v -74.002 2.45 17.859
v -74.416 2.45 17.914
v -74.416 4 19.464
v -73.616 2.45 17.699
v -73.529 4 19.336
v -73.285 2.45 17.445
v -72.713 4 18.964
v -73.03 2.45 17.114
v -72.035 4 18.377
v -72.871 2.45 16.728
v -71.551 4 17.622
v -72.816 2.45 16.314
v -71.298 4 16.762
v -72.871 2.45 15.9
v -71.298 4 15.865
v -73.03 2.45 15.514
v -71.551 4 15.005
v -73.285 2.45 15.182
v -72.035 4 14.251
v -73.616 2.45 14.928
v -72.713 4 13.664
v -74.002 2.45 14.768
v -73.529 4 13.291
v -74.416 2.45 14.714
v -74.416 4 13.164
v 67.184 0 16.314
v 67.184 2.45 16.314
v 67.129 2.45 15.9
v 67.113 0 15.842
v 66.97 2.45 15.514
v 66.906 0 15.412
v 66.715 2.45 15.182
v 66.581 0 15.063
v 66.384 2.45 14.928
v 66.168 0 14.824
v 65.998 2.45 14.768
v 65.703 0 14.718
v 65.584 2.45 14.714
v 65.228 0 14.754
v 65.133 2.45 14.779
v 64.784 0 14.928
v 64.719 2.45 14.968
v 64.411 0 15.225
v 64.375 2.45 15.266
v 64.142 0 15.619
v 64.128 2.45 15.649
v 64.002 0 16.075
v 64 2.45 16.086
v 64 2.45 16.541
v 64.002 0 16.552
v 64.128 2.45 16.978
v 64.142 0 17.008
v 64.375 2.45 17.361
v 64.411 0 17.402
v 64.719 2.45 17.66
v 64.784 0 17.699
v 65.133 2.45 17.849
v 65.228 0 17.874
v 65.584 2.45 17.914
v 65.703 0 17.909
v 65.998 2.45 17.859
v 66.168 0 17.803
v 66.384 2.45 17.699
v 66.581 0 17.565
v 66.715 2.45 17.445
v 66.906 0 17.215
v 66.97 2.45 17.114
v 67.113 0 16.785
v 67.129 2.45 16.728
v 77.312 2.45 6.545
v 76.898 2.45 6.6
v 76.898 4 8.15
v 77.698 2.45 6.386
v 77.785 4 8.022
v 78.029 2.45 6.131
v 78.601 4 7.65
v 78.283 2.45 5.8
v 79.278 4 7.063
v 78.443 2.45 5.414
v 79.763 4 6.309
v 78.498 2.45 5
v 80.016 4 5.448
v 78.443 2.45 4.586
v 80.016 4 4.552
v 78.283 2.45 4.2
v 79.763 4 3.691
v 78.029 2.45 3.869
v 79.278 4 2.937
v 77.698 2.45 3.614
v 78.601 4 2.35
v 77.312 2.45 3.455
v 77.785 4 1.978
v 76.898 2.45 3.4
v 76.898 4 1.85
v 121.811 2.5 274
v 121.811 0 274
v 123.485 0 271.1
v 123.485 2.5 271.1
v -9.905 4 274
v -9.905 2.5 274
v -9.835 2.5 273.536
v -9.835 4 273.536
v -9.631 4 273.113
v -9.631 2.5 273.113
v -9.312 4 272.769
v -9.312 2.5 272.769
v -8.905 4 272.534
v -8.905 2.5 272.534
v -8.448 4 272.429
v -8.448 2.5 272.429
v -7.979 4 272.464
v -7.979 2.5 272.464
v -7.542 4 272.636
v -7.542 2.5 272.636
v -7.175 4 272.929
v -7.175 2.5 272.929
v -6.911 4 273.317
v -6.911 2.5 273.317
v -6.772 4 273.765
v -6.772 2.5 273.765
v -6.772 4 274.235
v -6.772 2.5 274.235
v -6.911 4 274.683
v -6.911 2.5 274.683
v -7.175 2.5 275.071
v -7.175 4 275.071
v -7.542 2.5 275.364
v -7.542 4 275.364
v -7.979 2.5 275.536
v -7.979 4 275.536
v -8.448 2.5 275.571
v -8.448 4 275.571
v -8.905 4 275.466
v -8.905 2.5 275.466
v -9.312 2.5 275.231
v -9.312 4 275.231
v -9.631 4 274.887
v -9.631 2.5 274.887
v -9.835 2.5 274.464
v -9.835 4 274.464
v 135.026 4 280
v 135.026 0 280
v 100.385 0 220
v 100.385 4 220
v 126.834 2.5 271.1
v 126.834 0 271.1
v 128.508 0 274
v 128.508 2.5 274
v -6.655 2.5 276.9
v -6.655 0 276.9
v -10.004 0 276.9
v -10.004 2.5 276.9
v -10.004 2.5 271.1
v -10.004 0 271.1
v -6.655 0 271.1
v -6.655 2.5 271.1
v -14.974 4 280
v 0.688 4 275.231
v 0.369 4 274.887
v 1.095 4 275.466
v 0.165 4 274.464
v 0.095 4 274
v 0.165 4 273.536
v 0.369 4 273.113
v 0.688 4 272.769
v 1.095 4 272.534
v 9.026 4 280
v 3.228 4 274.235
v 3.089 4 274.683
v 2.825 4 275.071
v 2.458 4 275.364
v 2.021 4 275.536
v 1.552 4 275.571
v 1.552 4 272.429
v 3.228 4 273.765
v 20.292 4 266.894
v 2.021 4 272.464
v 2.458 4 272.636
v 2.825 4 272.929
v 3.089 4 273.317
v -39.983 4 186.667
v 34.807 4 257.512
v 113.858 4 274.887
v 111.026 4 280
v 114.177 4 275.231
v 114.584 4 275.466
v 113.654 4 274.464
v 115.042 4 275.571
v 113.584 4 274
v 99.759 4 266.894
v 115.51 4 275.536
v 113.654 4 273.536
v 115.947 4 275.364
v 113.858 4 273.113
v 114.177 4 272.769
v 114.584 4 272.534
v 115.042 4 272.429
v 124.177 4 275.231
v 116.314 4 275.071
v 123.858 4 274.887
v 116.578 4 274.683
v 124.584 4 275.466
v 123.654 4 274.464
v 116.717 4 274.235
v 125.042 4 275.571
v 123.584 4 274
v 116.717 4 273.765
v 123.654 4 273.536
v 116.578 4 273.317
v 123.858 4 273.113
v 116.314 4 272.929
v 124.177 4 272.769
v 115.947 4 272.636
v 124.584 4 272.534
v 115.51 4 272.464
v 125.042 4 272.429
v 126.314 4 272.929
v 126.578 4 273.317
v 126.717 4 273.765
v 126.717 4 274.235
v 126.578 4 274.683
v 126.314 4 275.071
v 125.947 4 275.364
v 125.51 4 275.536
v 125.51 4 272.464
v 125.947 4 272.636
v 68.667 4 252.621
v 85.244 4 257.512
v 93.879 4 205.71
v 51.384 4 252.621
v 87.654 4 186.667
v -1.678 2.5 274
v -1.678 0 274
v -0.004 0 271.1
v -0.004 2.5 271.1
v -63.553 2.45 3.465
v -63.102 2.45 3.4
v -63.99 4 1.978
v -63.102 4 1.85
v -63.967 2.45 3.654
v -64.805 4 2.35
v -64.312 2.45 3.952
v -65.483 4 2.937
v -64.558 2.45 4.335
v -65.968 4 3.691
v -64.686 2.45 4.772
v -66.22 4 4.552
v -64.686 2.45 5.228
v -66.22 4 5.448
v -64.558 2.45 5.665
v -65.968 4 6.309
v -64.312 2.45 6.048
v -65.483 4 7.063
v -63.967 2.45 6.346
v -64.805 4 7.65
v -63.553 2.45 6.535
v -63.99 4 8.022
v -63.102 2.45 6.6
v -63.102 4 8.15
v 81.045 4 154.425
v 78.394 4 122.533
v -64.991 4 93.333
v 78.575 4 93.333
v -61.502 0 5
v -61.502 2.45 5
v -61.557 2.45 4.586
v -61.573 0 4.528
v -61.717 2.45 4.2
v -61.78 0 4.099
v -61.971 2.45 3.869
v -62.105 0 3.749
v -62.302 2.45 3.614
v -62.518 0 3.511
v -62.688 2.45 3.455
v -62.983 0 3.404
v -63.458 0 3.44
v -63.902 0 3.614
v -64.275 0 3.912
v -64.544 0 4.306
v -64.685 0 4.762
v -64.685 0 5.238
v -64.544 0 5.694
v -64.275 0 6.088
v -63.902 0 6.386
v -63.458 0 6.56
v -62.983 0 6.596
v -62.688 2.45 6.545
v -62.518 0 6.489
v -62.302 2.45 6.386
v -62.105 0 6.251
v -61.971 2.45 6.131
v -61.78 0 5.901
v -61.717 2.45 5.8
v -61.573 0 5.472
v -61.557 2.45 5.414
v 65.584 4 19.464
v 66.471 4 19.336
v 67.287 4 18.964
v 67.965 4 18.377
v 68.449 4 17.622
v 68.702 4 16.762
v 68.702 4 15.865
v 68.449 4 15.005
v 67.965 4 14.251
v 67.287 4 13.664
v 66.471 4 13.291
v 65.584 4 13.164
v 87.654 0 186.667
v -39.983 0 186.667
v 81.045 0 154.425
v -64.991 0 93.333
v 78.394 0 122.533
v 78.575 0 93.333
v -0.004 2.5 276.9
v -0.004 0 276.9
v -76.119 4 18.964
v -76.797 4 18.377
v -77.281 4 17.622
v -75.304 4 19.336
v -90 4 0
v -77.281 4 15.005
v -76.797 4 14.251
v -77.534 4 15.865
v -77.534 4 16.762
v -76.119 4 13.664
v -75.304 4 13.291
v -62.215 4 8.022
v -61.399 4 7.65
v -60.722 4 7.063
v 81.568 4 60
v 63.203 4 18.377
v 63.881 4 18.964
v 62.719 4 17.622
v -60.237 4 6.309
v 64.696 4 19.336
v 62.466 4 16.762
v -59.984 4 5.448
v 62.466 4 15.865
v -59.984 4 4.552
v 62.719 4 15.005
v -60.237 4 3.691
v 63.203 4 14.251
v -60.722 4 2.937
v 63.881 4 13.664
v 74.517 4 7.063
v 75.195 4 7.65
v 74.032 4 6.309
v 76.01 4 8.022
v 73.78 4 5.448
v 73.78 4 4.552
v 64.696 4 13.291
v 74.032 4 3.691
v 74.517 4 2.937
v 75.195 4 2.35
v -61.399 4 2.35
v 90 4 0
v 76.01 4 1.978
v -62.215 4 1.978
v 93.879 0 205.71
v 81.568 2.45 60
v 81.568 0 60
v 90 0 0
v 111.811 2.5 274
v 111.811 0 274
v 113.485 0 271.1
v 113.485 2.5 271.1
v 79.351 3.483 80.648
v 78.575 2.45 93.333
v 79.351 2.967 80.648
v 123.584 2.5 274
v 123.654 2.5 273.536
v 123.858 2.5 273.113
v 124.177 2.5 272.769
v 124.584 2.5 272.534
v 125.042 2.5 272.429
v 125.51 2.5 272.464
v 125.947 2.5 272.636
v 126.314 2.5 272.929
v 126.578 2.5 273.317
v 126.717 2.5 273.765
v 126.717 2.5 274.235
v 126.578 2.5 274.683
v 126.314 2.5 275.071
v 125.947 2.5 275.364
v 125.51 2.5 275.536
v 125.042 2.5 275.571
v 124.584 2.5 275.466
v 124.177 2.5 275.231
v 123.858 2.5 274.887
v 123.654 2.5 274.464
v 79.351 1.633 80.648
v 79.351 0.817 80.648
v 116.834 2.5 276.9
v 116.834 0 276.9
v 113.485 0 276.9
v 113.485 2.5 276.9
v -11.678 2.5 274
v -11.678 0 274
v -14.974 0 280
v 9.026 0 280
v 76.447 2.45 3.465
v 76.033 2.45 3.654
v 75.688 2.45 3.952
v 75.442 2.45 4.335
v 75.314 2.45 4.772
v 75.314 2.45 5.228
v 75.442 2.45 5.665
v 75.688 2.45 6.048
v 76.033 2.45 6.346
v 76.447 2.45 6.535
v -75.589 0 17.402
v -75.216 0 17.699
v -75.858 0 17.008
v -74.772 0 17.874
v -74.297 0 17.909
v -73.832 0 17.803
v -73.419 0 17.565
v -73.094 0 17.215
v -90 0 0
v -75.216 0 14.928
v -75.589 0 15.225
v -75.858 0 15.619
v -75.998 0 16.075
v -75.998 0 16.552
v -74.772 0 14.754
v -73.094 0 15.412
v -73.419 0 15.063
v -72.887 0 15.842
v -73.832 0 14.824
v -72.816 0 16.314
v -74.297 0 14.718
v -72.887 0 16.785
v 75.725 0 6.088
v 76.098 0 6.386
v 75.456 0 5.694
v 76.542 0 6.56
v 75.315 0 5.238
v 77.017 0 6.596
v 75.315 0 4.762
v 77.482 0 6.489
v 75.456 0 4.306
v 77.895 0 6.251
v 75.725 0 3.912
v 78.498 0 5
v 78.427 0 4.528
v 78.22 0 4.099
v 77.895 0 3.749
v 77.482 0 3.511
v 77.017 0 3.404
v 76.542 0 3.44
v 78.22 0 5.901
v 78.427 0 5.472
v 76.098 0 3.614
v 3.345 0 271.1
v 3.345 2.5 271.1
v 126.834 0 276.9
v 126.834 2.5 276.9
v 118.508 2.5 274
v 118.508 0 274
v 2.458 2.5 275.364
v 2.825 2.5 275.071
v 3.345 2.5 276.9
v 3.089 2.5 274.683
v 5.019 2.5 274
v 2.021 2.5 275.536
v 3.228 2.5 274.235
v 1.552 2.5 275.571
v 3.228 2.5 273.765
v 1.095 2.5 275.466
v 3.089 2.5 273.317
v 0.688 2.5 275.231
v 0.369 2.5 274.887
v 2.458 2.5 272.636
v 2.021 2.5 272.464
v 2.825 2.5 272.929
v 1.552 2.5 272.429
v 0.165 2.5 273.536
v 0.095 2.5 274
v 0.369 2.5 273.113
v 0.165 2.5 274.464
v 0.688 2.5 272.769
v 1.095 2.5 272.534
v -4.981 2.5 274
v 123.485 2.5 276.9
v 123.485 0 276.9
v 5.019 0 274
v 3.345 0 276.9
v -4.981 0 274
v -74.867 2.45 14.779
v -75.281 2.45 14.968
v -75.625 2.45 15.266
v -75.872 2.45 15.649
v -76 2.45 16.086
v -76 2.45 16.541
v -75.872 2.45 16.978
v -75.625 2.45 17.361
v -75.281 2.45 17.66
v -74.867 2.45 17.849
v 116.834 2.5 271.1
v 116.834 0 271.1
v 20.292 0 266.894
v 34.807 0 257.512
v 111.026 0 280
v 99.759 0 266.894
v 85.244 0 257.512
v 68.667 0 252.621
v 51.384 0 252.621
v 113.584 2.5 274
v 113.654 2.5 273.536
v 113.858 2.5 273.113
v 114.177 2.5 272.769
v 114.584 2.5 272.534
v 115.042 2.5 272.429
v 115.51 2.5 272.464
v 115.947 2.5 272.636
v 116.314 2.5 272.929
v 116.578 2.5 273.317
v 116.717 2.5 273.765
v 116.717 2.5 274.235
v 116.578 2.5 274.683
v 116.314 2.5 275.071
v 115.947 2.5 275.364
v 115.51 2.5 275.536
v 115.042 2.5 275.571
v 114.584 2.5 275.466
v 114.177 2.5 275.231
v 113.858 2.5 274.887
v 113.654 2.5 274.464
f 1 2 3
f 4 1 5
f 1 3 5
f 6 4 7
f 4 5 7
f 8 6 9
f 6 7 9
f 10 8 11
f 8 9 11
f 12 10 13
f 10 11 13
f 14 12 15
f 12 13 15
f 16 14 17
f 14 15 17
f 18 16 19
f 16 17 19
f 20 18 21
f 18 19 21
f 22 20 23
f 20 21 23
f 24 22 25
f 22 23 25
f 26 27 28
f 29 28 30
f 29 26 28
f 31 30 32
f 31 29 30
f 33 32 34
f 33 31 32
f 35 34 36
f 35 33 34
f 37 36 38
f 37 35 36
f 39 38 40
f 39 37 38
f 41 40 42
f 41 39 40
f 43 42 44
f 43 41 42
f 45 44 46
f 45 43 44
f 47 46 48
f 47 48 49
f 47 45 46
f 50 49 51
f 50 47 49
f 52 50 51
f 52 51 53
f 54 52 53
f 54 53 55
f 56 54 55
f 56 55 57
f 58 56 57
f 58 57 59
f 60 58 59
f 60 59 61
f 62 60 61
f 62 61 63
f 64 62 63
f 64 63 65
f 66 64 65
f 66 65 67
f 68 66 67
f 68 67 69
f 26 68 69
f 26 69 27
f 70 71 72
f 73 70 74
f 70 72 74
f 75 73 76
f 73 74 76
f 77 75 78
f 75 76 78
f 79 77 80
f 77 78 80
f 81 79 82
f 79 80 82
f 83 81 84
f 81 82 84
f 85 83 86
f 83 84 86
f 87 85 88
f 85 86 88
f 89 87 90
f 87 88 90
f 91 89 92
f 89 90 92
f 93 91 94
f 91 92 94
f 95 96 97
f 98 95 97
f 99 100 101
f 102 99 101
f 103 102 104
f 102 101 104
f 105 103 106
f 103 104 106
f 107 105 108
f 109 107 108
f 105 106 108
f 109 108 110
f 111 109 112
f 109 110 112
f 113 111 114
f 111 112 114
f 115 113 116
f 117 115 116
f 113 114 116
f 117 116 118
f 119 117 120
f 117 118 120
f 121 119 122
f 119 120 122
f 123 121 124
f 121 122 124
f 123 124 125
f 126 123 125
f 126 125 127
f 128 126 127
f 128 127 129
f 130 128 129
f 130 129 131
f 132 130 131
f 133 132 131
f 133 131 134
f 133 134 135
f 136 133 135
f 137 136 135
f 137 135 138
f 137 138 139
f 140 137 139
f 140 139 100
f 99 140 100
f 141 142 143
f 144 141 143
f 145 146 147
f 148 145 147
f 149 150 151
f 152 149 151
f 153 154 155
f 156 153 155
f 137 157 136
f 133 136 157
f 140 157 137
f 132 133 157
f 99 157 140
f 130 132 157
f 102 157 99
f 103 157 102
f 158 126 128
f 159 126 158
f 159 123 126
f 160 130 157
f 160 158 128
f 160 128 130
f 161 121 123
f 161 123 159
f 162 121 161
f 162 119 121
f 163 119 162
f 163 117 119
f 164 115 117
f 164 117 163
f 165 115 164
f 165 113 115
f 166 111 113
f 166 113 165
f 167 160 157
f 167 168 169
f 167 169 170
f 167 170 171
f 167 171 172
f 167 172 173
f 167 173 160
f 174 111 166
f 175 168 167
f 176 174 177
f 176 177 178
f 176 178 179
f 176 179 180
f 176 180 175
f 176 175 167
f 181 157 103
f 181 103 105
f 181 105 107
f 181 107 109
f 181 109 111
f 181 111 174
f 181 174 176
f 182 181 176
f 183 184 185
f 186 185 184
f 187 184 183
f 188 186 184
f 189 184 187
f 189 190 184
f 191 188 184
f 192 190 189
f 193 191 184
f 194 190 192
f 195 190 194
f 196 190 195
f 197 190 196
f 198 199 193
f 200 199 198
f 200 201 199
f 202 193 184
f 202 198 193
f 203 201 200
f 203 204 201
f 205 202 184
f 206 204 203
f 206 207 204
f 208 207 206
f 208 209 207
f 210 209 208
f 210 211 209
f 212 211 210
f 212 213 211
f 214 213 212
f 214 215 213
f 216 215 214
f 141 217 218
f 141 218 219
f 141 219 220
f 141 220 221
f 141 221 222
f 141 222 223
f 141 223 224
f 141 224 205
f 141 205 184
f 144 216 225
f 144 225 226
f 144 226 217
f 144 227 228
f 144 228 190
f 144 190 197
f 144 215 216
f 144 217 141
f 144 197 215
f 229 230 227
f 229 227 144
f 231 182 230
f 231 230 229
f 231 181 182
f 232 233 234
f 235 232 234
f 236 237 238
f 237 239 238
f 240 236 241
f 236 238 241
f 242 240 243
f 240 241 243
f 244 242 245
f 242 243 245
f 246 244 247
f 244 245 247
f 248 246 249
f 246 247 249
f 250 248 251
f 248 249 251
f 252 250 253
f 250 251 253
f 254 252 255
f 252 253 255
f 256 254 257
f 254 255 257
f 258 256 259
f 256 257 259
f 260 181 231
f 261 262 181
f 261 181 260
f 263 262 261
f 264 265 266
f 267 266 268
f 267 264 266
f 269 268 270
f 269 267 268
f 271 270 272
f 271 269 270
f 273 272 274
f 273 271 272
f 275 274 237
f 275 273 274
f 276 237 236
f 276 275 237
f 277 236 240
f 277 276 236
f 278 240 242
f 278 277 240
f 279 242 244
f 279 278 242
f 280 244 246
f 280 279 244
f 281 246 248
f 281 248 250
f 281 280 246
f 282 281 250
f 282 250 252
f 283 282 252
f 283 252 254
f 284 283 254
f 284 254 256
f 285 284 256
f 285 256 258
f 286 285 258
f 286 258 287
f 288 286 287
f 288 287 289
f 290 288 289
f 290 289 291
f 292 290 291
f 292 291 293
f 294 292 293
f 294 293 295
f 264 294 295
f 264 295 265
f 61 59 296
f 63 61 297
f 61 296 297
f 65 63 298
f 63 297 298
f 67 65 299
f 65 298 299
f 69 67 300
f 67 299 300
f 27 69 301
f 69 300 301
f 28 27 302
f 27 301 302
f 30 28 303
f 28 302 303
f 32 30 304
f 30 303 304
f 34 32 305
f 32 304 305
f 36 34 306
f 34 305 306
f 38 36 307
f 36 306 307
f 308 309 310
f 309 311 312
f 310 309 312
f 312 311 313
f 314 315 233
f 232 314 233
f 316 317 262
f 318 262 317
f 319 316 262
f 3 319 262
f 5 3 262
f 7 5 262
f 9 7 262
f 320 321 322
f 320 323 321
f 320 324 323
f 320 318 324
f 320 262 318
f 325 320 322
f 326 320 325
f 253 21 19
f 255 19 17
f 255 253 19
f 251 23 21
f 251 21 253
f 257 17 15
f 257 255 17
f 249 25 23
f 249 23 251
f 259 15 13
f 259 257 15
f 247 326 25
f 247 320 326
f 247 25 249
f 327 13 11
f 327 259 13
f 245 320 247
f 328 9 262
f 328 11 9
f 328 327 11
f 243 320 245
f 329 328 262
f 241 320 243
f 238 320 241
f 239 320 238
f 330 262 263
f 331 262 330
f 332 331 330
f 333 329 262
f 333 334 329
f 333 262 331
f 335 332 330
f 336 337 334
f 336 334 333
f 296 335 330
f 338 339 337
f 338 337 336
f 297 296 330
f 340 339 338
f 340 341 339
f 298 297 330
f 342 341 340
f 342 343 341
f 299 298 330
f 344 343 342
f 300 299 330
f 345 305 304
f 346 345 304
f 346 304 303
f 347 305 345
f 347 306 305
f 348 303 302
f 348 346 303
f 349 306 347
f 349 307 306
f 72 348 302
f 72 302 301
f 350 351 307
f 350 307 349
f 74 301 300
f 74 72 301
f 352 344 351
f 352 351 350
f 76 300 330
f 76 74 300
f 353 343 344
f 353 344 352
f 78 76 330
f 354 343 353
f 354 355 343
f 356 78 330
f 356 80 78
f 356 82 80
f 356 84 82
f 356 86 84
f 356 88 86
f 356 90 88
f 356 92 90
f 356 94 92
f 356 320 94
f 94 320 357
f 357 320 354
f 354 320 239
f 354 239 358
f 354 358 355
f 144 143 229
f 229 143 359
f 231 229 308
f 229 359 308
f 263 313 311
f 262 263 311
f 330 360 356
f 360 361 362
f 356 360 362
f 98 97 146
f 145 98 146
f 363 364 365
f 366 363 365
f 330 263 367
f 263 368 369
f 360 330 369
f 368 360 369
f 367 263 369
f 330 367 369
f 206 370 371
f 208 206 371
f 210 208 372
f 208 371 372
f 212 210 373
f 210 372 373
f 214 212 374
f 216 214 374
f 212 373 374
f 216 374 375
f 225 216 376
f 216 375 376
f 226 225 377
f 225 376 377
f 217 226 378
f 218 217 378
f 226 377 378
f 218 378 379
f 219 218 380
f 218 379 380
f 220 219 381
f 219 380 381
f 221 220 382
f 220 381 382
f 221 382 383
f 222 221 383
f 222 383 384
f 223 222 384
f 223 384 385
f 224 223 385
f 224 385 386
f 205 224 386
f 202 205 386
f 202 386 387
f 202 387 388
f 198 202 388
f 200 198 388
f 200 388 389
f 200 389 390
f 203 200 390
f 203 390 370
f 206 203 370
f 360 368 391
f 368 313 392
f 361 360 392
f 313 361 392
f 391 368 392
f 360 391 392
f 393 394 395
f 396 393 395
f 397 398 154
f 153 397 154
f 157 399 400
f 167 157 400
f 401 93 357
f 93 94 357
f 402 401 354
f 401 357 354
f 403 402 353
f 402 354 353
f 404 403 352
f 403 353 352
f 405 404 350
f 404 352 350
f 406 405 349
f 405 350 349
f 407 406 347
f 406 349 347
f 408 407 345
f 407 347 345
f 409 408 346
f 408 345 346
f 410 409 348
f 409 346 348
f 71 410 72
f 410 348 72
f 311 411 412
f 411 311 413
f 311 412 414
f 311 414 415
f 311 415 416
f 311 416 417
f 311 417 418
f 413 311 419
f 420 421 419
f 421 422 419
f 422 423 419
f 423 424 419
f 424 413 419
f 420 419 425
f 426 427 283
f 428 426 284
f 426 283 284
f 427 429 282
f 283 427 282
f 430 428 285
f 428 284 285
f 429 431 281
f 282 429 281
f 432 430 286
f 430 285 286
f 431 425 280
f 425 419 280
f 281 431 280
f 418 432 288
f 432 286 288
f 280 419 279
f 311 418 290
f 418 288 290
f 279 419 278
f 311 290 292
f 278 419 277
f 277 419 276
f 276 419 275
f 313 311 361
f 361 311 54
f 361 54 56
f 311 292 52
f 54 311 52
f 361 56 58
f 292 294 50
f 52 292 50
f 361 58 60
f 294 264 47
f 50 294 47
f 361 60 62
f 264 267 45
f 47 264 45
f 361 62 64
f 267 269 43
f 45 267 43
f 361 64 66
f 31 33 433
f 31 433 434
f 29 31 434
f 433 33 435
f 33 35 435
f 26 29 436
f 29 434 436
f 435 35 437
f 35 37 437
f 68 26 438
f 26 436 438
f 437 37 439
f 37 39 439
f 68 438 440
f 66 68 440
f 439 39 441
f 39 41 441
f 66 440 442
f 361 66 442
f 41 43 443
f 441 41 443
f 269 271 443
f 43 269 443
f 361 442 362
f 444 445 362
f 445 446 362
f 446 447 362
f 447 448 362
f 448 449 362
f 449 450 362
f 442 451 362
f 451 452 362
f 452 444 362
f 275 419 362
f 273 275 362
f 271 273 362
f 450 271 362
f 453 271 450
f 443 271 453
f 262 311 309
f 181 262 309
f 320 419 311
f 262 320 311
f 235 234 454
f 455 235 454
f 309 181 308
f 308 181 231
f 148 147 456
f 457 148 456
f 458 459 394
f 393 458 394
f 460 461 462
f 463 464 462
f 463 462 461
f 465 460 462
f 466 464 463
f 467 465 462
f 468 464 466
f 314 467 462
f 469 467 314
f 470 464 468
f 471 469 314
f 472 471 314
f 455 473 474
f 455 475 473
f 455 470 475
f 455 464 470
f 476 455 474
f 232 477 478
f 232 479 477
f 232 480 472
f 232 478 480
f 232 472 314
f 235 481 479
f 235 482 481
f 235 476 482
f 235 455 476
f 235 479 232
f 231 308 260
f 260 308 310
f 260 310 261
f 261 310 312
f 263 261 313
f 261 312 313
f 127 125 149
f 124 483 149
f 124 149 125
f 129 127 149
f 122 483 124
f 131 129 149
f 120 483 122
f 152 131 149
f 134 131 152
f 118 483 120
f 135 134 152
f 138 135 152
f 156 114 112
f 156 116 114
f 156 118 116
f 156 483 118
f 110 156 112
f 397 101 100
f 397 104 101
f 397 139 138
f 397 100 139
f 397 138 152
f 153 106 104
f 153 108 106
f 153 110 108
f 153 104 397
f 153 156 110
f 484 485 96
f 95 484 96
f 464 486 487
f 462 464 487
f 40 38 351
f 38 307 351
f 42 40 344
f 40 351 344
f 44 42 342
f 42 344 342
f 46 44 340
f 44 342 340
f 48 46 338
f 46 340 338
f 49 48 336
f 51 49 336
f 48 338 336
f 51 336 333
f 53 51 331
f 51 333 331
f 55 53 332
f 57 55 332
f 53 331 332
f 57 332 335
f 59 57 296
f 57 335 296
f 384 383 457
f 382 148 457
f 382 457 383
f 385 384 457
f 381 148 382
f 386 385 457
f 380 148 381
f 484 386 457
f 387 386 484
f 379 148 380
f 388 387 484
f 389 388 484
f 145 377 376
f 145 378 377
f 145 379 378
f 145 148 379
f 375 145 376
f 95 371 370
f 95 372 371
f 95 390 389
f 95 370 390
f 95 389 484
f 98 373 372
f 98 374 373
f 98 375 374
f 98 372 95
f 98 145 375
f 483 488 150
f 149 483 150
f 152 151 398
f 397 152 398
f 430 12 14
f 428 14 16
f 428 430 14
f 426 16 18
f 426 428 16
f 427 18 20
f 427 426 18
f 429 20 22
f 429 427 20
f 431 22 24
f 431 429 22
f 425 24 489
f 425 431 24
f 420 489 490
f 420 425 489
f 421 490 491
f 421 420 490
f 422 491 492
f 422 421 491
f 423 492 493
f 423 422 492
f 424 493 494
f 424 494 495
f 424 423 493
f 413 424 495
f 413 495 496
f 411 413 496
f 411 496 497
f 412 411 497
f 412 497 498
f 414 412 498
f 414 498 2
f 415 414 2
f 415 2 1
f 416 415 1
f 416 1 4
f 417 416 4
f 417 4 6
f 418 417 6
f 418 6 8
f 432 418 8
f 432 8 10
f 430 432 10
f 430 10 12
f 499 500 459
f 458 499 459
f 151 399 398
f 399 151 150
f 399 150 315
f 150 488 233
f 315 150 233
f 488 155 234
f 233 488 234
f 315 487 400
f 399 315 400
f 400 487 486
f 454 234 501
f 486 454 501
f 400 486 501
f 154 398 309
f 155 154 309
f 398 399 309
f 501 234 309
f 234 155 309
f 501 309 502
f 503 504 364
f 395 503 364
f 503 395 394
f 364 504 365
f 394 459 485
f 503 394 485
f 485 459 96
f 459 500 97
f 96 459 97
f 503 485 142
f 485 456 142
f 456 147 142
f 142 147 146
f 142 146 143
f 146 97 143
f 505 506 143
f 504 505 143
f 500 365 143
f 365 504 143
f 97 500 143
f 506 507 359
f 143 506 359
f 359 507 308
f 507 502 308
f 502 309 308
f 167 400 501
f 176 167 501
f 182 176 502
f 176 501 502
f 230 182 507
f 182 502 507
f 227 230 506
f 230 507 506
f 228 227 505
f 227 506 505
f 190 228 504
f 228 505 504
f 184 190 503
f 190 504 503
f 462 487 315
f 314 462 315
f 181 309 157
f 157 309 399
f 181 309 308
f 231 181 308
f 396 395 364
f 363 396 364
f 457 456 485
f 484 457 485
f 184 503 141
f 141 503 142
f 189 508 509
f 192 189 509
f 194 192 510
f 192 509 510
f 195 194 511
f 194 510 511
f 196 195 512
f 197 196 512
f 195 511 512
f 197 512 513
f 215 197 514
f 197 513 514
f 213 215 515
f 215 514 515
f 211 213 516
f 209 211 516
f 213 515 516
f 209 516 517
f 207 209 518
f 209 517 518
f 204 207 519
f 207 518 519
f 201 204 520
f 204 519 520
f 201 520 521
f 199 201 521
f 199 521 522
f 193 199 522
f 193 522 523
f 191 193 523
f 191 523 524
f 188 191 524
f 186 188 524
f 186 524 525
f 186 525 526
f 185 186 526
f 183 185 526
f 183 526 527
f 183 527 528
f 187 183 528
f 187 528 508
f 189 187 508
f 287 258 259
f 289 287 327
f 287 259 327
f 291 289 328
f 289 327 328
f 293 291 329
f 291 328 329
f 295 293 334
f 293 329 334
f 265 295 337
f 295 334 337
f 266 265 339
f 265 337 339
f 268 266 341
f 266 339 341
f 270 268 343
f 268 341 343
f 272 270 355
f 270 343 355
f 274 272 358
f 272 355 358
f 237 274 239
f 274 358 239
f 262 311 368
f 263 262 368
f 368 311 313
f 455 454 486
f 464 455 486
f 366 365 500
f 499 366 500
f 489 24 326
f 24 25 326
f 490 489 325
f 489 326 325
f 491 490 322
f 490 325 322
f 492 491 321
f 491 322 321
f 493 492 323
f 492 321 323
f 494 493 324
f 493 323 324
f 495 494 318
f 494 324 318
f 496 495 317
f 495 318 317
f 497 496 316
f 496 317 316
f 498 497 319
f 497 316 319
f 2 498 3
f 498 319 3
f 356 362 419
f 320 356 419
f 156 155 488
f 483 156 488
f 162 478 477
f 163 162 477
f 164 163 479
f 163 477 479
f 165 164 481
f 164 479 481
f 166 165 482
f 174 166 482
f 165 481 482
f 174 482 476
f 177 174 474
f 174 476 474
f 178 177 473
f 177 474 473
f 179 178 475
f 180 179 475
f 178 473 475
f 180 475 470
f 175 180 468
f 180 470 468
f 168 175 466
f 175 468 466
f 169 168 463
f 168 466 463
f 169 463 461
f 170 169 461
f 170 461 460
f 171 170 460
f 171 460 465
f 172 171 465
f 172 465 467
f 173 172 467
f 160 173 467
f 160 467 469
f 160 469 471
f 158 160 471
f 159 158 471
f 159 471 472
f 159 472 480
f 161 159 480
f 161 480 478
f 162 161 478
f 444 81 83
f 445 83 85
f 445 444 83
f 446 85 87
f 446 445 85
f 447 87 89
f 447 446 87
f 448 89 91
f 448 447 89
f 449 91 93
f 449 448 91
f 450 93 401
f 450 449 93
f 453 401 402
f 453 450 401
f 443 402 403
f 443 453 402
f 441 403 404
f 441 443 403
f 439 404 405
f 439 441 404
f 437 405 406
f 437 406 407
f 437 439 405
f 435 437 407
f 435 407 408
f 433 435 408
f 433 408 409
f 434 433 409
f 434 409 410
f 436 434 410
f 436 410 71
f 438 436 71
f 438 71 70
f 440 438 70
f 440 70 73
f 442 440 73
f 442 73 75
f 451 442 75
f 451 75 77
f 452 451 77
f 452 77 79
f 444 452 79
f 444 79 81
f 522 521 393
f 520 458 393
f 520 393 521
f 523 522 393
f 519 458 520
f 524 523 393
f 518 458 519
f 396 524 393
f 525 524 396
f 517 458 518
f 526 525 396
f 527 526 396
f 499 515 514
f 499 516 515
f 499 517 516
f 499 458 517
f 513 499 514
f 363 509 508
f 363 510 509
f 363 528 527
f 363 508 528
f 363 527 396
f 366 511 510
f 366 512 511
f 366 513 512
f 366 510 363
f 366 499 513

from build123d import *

# Parameters (mm, degrees)
BOSS_EXTRUDE1_DEPTH                             = 4
CSK_FOR_M3_FLAT_HEAD_MACHINE_SCREW1_D           = 3.2
CSK_FOR_M3_FLAT_HEAD_MACHINE_SCREW1_CSINK_D     = 6.3
CSK_FOR_M3_FLAT_HEAD_MACHINE_SCREW1_CSINK_ANGLE = 90
TAP_DRILL_FOR_M3_HELICOIL1_D                    = 3.15
CUT_EXTRUDE2_DEPTH                              = 2.5
SPLIT1_OUTLINE_W                                = 182
SPLIT1_OUTLINE_H                                = 4
SPLIT1_DEPTH                                    = 186.66666666
SPLIT1_2_OUTLINE_R                              = 1.6
SPLIT1_2_DEPTH                                  = 2.4499999
SPLIT1_START                                    = 2.4499999
SPLIT1_3_DEPTH                                  = 1.5500001
SPLIT1_8_DEPTH                                  = 4


with BuildPart() as part:
    # Sketch1 → Boss-Extrude1 (new body)
    with BuildSketch(Plane(origin=(0, 0, 0), x_dir=(1, 0, 0), z_dir=(0, 1, 0))):
        with BuildLine():
            Line((81.567549918, -60), (90, 0))
            Line((90, 0), (-90, 0))
            Line((-90, 0), (-14.974226119, -280))
            Line((-14.974226119, -280), (9.025773881, -280))
            ThreePointArc((9.025773881, -280), (60.025773881, -252), (111.025773881, -280))
            Line((111.025773881, -280), (135.025773881, -280))
            Line((135.025773881, -280), (100.384757729, -220))
            add(Edge.make_bspline(
                [(100.384757729, -220), (95.344051169, -211.269240132), (73.389005734, -150.758031654), (78.220675853, -83.814246385), (81.567549918, -60)],
                knots=[0, 0, 0, 0, 0.285189486, 1, 1, 1, 1], degree=3))
        make_face()
    extrude(amount=BOSS_EXTRUDE1_DEPTH)

    # CSK for M3 Flat Head Machine Screw1 (through all)
    with Locations(Plane(origin=(0, 4, 0), x_dir=(1, 0, 0), z_dir=(0, 1, 0))):
        with Locations((-74.416095469, -16.313708499), (-63.10238697, -5), (65.583904531, -16.313708499), (76.89761303, -5)):
            CounterSinkHole(CSK_FOR_M3_FLAT_HEAD_MACHINE_SCREW1_D / 2, CSK_FOR_M3_FLAT_HEAD_MACHINE_SCREW1_CSINK_D / 2, counter_sink_angle=CSK_FOR_M3_FLAT_HEAD_MACHINE_SCREW1_CSINK_ANGLE)

    # Tap Drill for M3 Helicoil1 (through all)
    with Locations(Plane(origin=(0, 4, 0), x_dir=(1, 0, 0), z_dir=(0, 1, 0))):
        with Locations((-8.329810717, -274), (1.670189283, -274), (125.15946328, -274), (115.15946328, -274)):
            Hole(TAP_DRILL_FOR_M3_HELICOIL1_D / 2)

    # Sketch13 → Cut-Extrude2 (cut)
    with BuildSketch(Plane(origin=(0, 0, 0), x_dir=(-1, 0, 0), z_dir=(0, -1, 0))):
        Polygon((-113.485147499, -276.9), (-111.810831718, -274), (-113.485147499, -271.1), (-116.83377906, -271.1), (-118.508094841, -274), (-116.83377906, -276.9), align=None)
        Polygon((-123.485147499, -276.9), (-121.810831718, -274), (-123.485147499, -271.1), (-126.83377906, -271.1), (-128.508094841, -274), (-126.83377906, -276.9), align=None)
        Polygon((10.004126498, -276.9), (11.678442278, -274), (10.004126498, -271.1), (6.655494936, -271.1), (4.981179156, -274), (6.655494936, -276.9), align=None)
        Polygon((0.004126498, -276.9), (1.678442278, -274), (0.004126498, -271.1), (-3.344505064, -271.1), (-5.018820844, -274), (-3.344505064, -276.9), align=None)
    extrude(amount=-CUT_EXTRUDE2_DEPTH, mode=Mode.SUBTRACT)

    # Split1: read off the stored shape, not the designer's step
    # Split1 outline → Split1 (cut)
    with BuildSketch(Plane.XY):
        with Locations((0, 2)):
            Rectangle(SPLIT1_OUTLINE_W, SPLIT1_OUTLINE_H)
    extrude(amount=SPLIT1_DEPTH, mode=Mode.SUBTRACT)


with BuildPart() as body_2:
    # Split1 2 outline → Split1 2 (new body)
    with BuildSketch(Plane(origin=(0, 0, 0), x_dir=(1, 0, 0), z_dir=(0, 1, 0))):
        with BuildLine():
            Line((-64.991408707, -93.33333333), (78.575108831, -93.33333333))
            add(Edge.make_bspline(
                [(78.575108831, -93.33333333), (79.171445332, -79.99826686), (80.376266468, -68.476422189), (81.567549918, -60)],
                knots=[0.745570966, 0.745570966, 0.745570966, 0.745570966, 1, 1, 1, 1], degree=3))
            Line((81.567549918, -60), (90, 0))
            Line((90, 0), (-90, 0))
            Line((-90, 0), (-64.991408707, -93.33333333))
        make_face()
        with Locations((-74.416095469, -16.313708499)):
            Circle(SPLIT1_2_OUTLINE_R, mode=Mode.SUBTRACT)
        with Locations((-63.10238697, -5)):
            Circle(SPLIT1_2_OUTLINE_R, mode=Mode.SUBTRACT)
        with Locations((65.583904531, -16.313708499)):
            Circle(SPLIT1_2_OUTLINE_R, mode=Mode.SUBTRACT)
        with Locations((76.89761303, -5)):
            Circle(SPLIT1_2_OUTLINE_R, mode=Mode.SUBTRACT)
    extrude(amount=SPLIT1_2_DEPTH)

    # Split1 3 outline → Split1 3 (add)
    with BuildSketch(Plane(origin=(0, 0, 0), x_dir=(1, 0, 0), z_dir=(0, 1, 0)).offset(SPLIT1_START)):
        with BuildLine():
            Line((-64.991408707, -93.33333333), (78.575108831, -93.33333333))
            add(Edge.make_bspline(
                [(78.575108831, -93.33333333), (79.171445332, -79.99826686), (80.376266468, -68.476422189), (81.567549918, -60)],
                knots=[0.745570966, 0.745570966, 0.745570966, 0.745570966, 1, 1, 1, 1], degree=3))
            Line((81.567549918, -60), (90, 0))
            Line((90, 0), (-90, 0))
            Line((-90, 0), (-64.991408707, -93.33333333))
        make_face()
    extrude(amount=SPLIT1_3_DEPTH)

    # Split1 4: loft between two sections, ruled curve by curve
    split1_4_from = [
        Edge.make_three_point_arc((76.89761303, 2.45, 6.6), (78.49761303, 2.45, 5), (76.89761303, 2.45, 3.4)),
        Edge.make_three_point_arc((76.89761303, 2.45, 3.4), (75.29761303, 2.45, 5), (76.89761303, 2.45, 6.6)),
    ]
    split1_4_to = [
        Edge.make_three_point_arc((76.89761303, 4, 8.15), (80.04761303, 4, 5), (76.89761303, 4, 1.85)),
        Edge.make_three_point_arc((76.89761303, 4, 1.85), (73.74761303, 4, 5), (76.89761303, 4, 8.15)),
    ]
    split1_4 = Solid(Shell([*[Face.make_surface_from_curves(split1_4_from[k], split1_4_to[k]) for k in range(2)], Face(Wire(split1_4_from)), Face(Wire(split1_4_to))]))
    add(split1_4, mode=Mode.SUBTRACT)

    # Split1 5: loft between two sections, ruled curve by curve
    split1_5_from = [
        Edge.make_three_point_arc((65.583904531, 2.45, 17.913708499), (67.183904531, 2.45, 16.313708499), (65.583904531, 2.45, 14.713708499)),
        Edge.make_three_point_arc((65.583904531, 2.45, 14.713708499), (63.983904531, 2.45, 16.313708499), (65.583904531, 2.45, 17.913708499)),
    ]
    split1_5_to = [
        Edge.make_three_point_arc((65.583904531, 4, 19.463708499), (68.733904531, 4, 16.313708499), (65.583904531, 4, 13.163708499)),
        Edge.make_three_point_arc((65.583904531, 4, 13.163708499), (62.433904531, 4, 16.313708499), (65.583904531, 4, 19.463708499)),
    ]
    split1_5 = Solid(Shell([*[Face.make_surface_from_curves(split1_5_from[k], split1_5_to[k]) for k in range(2)], Face(Wire(split1_5_from)), Face(Wire(split1_5_to))]))
    add(split1_5, mode=Mode.SUBTRACT)

    # Split1 6: loft between two sections, ruled curve by curve
    split1_6_from = [
        Edge.make_three_point_arc((-63.10238697, 2.45, 6.6), (-61.50238697, 2.45, 5), (-63.10238697, 2.45, 3.4)),
        Edge.make_three_point_arc((-63.10238697, 2.45, 3.4), (-64.70238697, 2.45, 5), (-63.10238697, 2.45, 6.6)),
    ]
    split1_6_to = [
        Edge.make_three_point_arc((-63.10238697, 4, 8.15), (-59.95238697, 4, 5), (-63.10238697, 4, 1.85)),
        Edge.make_three_point_arc((-63.10238697, 4, 1.85), (-66.25238697, 4, 5), (-63.10238697, 4, 8.15)),
    ]
    split1_6 = Solid(Shell([*[Face.make_surface_from_curves(split1_6_from[k], split1_6_to[k]) for k in range(2)], Face(Wire(split1_6_from)), Face(Wire(split1_6_to))]))
    add(split1_6, mode=Mode.SUBTRACT)

    # Split1 7: loft between two sections, ruled curve by curve
    split1_7_from = [
        Edge.make_three_point_arc((-74.416095469, 2.45, 17.913708499), (-72.816095469, 2.45, 16.313708499), (-74.416095469, 2.45, 14.713708499)),
        Edge.make_three_point_arc((-74.416095469, 2.45, 14.713708499), (-76.016095469, 2.45, 16.313708499), (-74.416095469, 2.45, 17.913708499)),
    ]
    split1_7_to = [
        Edge.make_three_point_arc((-74.416095469, 4, 19.463708499), (-71.266095469, 4, 16.313708499), (-74.416095469, 4, 13.163708499)),
        Edge.make_three_point_arc((-74.416095469, 4, 13.163708499), (-77.566095469, 4, 16.313708499), (-74.416095469, 4, 19.463708499)),
    ]
    split1_7 = Solid(Shell([*[Face.make_surface_from_curves(split1_7_from[k], split1_7_to[k]) for k in range(2)], Face(Wire(split1_7_from)), Face(Wire(split1_7_to))]))
    add(split1_7, mode=Mode.SUBTRACT)


with BuildPart() as body_3:
    # Split1 8 outline → Split1 8 (new body)
    with BuildSketch(Plane(origin=(0, 0, 0), x_dir=(1, 0, 0), z_dir=(0, 1, 0))):
        with BuildLine():
            Line((-39.982817415, -186.66666666), (87.654154717, -186.66666666))
            add(Edge.make_bspline(
                [(87.654154717, -186.66666666), (86.701649765, -183.250236687), (78.52127075, -151.215603108), (77.496056347, -117.462724315), (78.575108831, -93.33333333)],
                knots=[0.228738149, 0.228738149, 0.228738149, 0.228738149, 0.285189486, 0.745570966, 0.745570966, 0.745570966, 0.745570966], degree=3))
            Line((78.575108831, -93.33333333), (-64.991408707, -93.33333333))
            Line((-64.991408707, -93.33333333), (-39.982817415, -186.66666666))
        make_face()
    extrude(amount=SPLIT1_8_DEPTH)


solid = Compound([part.part, body_2.part, body_3.part])
